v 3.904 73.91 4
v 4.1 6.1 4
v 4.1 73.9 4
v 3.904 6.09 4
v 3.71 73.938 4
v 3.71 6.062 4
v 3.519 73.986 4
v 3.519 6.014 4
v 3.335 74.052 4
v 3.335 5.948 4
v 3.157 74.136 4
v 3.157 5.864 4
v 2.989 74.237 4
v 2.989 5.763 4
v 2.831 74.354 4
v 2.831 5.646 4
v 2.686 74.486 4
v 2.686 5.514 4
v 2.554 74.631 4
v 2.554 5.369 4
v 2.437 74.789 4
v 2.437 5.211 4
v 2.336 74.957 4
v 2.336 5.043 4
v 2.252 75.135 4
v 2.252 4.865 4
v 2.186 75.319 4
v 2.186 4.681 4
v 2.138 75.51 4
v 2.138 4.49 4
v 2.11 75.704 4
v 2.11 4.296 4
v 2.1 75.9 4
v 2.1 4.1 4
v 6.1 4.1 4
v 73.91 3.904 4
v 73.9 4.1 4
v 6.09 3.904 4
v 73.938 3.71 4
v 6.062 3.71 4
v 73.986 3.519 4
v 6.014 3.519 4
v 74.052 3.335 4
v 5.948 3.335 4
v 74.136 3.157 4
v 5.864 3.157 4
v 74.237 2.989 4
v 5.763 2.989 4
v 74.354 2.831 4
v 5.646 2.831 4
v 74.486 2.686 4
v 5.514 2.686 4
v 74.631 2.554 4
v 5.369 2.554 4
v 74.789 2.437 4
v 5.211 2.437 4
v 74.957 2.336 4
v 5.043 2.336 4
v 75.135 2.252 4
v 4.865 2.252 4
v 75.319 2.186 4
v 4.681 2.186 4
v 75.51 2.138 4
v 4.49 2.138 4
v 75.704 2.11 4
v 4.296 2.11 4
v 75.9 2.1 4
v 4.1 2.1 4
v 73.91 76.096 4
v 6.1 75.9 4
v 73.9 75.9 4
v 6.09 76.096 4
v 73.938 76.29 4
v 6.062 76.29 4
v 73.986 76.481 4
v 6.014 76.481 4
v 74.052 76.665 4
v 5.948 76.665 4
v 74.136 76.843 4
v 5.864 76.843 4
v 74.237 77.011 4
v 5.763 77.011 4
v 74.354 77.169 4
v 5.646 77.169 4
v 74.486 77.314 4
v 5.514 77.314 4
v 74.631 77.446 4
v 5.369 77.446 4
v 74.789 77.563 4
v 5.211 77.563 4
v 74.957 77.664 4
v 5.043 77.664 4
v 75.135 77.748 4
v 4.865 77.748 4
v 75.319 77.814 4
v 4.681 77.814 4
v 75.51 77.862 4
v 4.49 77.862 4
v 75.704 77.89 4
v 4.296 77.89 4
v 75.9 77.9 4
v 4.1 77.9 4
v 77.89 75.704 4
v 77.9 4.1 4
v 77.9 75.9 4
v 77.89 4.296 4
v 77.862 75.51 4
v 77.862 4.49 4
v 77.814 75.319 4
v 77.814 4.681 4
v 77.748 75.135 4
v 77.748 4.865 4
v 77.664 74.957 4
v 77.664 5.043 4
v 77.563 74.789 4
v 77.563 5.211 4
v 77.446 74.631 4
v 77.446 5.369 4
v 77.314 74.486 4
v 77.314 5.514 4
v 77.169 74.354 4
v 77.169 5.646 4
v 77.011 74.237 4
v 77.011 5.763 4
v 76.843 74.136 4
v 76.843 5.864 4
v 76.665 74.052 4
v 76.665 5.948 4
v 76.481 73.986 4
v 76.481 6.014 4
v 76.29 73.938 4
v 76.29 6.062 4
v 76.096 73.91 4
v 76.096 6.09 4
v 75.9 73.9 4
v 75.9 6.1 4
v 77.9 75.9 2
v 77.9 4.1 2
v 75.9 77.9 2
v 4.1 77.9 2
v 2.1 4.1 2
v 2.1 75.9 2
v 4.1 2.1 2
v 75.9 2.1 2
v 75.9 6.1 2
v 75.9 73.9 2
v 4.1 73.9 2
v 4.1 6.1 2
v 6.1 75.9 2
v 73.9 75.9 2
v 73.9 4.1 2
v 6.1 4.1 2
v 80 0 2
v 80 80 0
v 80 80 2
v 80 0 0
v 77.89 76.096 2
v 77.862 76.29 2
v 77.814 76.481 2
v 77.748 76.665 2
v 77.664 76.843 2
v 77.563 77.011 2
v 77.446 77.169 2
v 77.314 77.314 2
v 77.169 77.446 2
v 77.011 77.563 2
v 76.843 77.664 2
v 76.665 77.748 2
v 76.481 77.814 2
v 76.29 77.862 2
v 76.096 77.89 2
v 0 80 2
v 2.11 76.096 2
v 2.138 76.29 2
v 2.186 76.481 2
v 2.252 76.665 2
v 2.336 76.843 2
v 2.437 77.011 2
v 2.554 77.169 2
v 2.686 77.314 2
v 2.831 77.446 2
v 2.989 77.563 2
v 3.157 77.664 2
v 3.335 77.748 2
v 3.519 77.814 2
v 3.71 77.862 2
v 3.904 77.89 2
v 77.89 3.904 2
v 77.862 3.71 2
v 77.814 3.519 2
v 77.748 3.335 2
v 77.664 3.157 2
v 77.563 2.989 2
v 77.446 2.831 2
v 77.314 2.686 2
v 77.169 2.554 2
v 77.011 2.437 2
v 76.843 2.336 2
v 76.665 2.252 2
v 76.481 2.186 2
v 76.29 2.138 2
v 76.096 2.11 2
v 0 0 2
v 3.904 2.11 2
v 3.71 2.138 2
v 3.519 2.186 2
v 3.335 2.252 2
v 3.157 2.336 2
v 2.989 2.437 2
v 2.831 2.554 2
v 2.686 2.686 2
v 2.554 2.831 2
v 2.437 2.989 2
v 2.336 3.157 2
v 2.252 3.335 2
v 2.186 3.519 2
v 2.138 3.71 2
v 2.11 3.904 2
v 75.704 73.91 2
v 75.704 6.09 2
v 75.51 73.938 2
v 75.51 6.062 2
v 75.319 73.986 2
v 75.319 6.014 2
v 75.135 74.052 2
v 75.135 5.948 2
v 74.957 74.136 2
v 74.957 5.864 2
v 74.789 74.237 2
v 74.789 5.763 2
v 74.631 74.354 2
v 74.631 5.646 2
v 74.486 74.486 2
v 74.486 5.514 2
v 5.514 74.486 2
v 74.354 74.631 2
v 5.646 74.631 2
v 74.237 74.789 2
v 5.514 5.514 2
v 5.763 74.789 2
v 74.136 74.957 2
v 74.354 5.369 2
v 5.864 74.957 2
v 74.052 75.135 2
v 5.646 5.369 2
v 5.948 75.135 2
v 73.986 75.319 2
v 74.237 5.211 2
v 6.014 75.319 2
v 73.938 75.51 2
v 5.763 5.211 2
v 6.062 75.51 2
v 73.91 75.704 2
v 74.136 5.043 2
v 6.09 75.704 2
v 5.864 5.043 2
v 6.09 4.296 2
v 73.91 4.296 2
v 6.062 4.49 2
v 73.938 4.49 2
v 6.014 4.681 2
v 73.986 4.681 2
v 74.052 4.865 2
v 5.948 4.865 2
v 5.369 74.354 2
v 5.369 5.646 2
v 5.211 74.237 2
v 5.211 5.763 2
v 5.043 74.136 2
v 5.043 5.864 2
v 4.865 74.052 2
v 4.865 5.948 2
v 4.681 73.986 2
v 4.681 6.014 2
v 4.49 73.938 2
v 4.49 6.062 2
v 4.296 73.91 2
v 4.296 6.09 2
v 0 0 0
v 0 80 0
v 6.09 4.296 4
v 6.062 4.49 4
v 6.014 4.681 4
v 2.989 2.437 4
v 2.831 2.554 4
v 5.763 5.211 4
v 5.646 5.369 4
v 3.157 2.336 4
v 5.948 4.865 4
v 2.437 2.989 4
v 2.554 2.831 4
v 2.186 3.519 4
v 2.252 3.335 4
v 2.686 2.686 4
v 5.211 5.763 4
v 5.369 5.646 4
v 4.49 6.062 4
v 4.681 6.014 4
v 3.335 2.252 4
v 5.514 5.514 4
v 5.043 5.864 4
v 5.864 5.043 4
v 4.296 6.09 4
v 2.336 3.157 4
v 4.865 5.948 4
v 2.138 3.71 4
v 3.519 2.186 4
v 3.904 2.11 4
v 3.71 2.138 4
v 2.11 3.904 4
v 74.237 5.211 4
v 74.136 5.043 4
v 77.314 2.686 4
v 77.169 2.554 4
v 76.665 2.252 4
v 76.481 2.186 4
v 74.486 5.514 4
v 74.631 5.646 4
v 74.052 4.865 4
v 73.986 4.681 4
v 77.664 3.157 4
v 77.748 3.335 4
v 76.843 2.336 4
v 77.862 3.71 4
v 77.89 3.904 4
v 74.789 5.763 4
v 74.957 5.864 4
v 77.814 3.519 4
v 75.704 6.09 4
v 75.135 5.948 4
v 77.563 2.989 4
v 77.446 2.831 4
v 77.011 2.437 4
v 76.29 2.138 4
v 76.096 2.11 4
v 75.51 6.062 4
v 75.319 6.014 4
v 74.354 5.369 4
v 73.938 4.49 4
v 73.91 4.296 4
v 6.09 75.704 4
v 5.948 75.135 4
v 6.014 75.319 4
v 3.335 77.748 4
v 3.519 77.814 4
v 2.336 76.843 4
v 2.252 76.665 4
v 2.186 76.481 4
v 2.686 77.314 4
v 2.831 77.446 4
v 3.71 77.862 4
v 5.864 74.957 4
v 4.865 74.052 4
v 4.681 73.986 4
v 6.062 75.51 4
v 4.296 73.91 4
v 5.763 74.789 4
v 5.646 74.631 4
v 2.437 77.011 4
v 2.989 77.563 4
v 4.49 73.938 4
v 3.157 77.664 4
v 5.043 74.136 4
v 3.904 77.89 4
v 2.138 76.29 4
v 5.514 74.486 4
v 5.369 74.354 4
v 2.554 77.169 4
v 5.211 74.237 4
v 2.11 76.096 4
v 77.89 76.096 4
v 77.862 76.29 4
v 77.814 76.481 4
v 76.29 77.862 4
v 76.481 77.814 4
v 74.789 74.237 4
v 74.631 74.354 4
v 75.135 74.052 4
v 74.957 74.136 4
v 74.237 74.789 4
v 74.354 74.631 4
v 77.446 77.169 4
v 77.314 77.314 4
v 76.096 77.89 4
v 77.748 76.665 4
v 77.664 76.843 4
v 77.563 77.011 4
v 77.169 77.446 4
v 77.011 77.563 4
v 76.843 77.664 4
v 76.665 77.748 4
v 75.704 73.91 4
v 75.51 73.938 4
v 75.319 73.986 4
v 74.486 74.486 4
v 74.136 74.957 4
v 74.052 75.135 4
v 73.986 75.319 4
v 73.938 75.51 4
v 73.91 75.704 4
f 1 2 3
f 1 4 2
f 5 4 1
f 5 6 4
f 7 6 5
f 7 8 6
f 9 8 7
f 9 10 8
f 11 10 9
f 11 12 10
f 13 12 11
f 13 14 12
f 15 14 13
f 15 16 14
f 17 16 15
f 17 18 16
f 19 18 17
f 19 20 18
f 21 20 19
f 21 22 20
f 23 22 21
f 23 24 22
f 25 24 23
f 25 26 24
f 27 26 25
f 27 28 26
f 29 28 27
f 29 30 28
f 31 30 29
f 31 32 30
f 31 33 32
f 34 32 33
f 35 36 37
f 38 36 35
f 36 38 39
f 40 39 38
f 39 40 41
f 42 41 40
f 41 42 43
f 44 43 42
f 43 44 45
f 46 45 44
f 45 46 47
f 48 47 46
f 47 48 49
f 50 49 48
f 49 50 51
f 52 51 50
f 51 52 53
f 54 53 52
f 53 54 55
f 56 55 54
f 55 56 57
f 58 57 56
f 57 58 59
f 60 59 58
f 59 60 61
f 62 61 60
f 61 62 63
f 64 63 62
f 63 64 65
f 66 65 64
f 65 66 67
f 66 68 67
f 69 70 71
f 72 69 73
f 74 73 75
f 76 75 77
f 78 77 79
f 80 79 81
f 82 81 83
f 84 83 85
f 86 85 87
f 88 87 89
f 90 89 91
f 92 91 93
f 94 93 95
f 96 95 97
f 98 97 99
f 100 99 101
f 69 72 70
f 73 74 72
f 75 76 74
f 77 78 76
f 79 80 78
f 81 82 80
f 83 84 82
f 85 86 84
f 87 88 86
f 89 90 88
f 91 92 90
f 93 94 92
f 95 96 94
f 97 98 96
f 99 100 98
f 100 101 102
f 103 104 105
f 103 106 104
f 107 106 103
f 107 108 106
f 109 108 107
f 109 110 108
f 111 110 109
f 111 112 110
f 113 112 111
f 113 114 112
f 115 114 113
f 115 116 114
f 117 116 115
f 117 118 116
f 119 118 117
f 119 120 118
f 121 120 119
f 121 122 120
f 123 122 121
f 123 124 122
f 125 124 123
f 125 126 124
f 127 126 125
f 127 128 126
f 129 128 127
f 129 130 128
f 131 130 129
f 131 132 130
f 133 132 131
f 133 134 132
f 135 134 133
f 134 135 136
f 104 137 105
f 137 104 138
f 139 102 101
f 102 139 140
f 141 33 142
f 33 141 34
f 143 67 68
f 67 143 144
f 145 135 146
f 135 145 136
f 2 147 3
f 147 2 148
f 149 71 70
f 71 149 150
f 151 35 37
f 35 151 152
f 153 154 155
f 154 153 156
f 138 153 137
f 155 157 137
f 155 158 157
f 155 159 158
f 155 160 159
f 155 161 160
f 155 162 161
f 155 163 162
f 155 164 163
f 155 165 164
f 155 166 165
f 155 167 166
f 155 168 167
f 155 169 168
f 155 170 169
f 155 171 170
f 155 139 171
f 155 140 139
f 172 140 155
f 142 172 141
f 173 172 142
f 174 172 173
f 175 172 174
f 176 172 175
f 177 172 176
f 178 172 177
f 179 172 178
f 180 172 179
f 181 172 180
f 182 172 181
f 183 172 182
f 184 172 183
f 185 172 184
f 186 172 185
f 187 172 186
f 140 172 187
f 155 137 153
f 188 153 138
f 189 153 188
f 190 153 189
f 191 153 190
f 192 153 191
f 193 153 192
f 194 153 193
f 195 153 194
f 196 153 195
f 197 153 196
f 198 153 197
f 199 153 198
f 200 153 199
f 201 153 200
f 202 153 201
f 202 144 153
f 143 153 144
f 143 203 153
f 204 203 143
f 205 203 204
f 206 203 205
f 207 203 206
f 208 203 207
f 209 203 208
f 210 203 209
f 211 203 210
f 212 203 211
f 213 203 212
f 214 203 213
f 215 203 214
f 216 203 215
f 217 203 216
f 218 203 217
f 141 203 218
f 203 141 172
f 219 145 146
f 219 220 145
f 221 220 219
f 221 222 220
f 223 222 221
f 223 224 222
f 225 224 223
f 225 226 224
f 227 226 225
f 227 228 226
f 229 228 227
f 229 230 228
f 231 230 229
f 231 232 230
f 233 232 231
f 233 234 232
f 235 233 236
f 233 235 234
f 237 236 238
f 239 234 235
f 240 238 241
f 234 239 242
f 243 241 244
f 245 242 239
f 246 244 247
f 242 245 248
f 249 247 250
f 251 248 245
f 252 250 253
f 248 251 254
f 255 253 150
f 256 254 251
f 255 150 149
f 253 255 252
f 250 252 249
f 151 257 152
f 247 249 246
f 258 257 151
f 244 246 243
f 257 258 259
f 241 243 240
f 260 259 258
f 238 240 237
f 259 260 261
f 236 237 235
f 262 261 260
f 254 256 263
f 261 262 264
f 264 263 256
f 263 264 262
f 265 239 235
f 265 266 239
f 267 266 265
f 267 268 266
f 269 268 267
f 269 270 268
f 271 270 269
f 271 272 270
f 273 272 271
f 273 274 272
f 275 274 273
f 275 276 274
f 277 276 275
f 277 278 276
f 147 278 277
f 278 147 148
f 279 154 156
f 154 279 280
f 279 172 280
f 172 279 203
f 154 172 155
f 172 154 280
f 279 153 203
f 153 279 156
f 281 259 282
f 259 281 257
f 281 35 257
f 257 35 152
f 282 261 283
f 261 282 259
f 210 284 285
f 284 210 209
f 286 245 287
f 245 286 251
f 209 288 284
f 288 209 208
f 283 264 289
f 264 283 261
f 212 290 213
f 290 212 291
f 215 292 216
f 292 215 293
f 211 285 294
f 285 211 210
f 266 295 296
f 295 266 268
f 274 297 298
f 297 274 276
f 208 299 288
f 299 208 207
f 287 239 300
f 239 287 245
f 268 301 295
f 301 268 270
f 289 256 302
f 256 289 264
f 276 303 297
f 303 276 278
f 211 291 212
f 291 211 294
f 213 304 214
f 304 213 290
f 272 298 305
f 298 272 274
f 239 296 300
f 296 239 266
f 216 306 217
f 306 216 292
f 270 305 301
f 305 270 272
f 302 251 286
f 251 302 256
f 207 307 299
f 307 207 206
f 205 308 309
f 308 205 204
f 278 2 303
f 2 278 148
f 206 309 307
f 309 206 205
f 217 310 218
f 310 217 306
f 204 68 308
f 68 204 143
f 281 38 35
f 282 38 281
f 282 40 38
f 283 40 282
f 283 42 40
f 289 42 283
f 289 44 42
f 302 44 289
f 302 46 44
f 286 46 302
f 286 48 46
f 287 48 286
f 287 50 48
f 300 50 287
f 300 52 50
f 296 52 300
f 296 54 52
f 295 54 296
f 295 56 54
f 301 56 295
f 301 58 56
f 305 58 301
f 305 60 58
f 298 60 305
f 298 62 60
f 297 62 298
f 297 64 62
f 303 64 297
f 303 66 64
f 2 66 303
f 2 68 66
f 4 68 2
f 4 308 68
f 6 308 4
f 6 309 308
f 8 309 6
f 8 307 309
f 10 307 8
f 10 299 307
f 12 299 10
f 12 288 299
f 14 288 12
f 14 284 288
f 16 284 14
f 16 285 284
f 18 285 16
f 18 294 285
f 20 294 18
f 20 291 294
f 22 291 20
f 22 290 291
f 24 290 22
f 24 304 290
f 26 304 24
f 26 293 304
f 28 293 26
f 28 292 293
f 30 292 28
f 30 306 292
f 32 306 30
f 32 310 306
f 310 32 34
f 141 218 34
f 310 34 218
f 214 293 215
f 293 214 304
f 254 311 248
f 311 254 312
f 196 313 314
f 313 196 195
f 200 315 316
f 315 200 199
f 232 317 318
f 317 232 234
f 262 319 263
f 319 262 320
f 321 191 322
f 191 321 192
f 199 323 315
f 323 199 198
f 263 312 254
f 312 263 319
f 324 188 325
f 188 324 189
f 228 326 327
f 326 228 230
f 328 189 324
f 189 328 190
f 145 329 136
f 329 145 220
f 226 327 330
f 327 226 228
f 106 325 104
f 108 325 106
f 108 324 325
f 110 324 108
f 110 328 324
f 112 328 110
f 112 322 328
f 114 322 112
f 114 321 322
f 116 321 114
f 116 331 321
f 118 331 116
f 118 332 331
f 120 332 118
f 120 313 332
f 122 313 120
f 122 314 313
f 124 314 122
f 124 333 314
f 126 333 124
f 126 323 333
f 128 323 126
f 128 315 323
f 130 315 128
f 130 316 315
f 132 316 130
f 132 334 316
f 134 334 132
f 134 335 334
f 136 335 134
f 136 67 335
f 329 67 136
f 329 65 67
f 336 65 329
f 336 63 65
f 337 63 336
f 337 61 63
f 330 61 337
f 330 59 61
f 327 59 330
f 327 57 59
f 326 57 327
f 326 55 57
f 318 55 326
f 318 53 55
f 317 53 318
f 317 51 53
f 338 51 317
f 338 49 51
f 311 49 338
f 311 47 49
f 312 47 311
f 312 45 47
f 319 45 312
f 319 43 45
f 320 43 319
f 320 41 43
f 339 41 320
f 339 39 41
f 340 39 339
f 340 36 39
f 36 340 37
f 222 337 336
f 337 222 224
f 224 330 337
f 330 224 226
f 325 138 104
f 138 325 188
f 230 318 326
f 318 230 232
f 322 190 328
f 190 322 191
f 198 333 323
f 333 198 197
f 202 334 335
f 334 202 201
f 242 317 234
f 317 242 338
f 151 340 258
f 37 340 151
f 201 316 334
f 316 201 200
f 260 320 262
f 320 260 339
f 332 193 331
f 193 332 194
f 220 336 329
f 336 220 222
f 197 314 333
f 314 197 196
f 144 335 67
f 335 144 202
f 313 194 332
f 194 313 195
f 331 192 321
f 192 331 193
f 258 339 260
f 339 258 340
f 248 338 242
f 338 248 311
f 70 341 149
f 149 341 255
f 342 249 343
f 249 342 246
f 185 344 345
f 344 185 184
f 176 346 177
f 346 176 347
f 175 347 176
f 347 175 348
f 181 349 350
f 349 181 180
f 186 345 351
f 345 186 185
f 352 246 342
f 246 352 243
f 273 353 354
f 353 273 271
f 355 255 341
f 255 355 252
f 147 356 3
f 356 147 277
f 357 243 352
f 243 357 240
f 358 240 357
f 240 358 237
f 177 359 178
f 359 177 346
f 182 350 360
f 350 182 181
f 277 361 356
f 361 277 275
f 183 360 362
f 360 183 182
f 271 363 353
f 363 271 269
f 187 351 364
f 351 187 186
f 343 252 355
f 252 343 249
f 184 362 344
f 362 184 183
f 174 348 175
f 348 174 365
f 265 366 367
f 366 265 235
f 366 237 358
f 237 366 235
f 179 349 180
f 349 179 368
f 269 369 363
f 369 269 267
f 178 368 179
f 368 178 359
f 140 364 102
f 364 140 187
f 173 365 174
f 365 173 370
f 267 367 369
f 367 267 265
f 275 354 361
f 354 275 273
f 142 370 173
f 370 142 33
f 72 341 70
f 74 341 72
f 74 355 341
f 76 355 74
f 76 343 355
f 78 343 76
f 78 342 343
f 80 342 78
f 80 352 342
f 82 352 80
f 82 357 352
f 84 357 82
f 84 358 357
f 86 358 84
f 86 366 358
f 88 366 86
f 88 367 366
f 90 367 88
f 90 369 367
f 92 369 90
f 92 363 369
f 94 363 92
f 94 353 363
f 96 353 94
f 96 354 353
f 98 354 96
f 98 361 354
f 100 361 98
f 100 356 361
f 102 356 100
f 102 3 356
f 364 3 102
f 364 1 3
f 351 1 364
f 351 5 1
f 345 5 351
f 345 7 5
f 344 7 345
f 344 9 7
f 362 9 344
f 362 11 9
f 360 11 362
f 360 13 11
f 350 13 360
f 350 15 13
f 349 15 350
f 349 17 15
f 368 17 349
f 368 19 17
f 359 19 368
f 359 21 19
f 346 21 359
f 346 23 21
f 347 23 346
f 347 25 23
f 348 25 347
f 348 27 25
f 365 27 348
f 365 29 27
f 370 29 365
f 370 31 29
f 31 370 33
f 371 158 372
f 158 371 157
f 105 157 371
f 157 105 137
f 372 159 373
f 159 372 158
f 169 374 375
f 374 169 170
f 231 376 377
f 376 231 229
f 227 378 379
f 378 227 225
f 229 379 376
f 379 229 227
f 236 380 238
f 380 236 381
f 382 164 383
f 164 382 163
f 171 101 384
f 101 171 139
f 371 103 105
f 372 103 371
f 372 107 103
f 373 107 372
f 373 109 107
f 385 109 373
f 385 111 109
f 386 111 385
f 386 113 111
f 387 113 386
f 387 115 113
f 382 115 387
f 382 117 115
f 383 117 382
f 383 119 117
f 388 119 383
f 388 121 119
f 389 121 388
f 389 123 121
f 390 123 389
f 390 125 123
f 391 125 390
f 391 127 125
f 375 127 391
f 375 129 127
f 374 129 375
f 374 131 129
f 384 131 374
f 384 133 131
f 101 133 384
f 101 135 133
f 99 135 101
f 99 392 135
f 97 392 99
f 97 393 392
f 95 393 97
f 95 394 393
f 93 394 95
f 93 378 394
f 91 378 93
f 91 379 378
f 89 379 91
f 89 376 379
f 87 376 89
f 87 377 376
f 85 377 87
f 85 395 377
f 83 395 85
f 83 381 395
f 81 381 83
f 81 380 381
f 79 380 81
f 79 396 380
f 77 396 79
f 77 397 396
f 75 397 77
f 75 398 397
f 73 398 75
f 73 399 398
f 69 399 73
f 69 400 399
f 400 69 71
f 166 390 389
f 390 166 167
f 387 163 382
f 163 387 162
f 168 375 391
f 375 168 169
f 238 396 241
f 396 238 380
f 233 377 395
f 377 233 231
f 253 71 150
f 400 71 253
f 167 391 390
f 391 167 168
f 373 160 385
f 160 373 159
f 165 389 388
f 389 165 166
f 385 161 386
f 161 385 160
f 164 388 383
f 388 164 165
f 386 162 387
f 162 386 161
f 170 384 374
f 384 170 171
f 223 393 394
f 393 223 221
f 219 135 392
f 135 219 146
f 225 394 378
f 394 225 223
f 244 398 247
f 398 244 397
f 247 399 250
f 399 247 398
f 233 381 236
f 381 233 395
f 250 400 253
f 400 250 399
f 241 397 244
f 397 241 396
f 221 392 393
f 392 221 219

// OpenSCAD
$fn = 64;
wall = 2;
eps  = 0.01;
play = 0.1;

module boxBottom( w, d, h ) {
    cube( [ w, d, wall ] );

    cube( [ wall, d, h ] );

    cube( [ w, wall, h ] );

    translate( [ w-wall, 0, 0 ] )
    cube( [ wall, d, h ] );

    translate( [ 0, d-wall, 0 ] )
    cube( [ w, wall, h ] );
    
}

module boxTop( w, d, h ) {
    bump = 2;
    cornerR = 2;
    cornerOff = cornerR + wall + play;

    cube( [ w, d, wall ] );

    translate( [ cornerOff, cornerOff, wall - eps ] )
    cylinder( r=cornerR, h=bump+eps );

    translate( [ w - cornerOff, cornerOff, wall - eps ] )
    cylinder( r=cornerR, h=bump+eps );

    translate( [ cornerOff, d - cornerOff, wall - eps ] )
    cylinder( r=cornerR, h=bump+eps );

    translate( [ w - cornerOff, d - cornerOff, wall - eps ] )
    cylinder( r=cornerR, h=bump+eps );

    translate( [ 0, 0, wall - eps ] )
    difference() {
        linear_extrude( bump+eps )
        polygon( [
            [ cornerOff, cornerOff - cornerR ],
            [ w - cornerOff, cornerOff - cornerR ],
            [ w - cornerOff, cornerOff ],
            [ w - cornerOff + cornerR, cornerOff ],
            [ w - cornerOff + cornerR, d - cornerOff ],
            [ w - cornerOff,           d - cornerOff ],
            [ w - cornerOff,           d - cornerOff + cornerR ],
            [ cornerOff,               d - cornerOff + cornerR ],
            [ cornerOff,               d - cornerOff ],
            [ cornerOff - cornerR,     d - cornerOff ],
            [ cornerOff - cornerR,     cornerOff ],
            [ cornerOff,               cornerOff ],
        ] );
        
        translate( [ cornerOff, cornerOff, 0 ] )
        cube( [ w - 2*cornerOff, d - 2*cornerOff, bump *2 ] ); 
    }
}


// boxBottom( 80, 80, 32 );

// translate( [ 0, 80, 40 ] )
// rotate( [ 180, 0, 0 ] )

boxTop( 80, 80, 20 );
